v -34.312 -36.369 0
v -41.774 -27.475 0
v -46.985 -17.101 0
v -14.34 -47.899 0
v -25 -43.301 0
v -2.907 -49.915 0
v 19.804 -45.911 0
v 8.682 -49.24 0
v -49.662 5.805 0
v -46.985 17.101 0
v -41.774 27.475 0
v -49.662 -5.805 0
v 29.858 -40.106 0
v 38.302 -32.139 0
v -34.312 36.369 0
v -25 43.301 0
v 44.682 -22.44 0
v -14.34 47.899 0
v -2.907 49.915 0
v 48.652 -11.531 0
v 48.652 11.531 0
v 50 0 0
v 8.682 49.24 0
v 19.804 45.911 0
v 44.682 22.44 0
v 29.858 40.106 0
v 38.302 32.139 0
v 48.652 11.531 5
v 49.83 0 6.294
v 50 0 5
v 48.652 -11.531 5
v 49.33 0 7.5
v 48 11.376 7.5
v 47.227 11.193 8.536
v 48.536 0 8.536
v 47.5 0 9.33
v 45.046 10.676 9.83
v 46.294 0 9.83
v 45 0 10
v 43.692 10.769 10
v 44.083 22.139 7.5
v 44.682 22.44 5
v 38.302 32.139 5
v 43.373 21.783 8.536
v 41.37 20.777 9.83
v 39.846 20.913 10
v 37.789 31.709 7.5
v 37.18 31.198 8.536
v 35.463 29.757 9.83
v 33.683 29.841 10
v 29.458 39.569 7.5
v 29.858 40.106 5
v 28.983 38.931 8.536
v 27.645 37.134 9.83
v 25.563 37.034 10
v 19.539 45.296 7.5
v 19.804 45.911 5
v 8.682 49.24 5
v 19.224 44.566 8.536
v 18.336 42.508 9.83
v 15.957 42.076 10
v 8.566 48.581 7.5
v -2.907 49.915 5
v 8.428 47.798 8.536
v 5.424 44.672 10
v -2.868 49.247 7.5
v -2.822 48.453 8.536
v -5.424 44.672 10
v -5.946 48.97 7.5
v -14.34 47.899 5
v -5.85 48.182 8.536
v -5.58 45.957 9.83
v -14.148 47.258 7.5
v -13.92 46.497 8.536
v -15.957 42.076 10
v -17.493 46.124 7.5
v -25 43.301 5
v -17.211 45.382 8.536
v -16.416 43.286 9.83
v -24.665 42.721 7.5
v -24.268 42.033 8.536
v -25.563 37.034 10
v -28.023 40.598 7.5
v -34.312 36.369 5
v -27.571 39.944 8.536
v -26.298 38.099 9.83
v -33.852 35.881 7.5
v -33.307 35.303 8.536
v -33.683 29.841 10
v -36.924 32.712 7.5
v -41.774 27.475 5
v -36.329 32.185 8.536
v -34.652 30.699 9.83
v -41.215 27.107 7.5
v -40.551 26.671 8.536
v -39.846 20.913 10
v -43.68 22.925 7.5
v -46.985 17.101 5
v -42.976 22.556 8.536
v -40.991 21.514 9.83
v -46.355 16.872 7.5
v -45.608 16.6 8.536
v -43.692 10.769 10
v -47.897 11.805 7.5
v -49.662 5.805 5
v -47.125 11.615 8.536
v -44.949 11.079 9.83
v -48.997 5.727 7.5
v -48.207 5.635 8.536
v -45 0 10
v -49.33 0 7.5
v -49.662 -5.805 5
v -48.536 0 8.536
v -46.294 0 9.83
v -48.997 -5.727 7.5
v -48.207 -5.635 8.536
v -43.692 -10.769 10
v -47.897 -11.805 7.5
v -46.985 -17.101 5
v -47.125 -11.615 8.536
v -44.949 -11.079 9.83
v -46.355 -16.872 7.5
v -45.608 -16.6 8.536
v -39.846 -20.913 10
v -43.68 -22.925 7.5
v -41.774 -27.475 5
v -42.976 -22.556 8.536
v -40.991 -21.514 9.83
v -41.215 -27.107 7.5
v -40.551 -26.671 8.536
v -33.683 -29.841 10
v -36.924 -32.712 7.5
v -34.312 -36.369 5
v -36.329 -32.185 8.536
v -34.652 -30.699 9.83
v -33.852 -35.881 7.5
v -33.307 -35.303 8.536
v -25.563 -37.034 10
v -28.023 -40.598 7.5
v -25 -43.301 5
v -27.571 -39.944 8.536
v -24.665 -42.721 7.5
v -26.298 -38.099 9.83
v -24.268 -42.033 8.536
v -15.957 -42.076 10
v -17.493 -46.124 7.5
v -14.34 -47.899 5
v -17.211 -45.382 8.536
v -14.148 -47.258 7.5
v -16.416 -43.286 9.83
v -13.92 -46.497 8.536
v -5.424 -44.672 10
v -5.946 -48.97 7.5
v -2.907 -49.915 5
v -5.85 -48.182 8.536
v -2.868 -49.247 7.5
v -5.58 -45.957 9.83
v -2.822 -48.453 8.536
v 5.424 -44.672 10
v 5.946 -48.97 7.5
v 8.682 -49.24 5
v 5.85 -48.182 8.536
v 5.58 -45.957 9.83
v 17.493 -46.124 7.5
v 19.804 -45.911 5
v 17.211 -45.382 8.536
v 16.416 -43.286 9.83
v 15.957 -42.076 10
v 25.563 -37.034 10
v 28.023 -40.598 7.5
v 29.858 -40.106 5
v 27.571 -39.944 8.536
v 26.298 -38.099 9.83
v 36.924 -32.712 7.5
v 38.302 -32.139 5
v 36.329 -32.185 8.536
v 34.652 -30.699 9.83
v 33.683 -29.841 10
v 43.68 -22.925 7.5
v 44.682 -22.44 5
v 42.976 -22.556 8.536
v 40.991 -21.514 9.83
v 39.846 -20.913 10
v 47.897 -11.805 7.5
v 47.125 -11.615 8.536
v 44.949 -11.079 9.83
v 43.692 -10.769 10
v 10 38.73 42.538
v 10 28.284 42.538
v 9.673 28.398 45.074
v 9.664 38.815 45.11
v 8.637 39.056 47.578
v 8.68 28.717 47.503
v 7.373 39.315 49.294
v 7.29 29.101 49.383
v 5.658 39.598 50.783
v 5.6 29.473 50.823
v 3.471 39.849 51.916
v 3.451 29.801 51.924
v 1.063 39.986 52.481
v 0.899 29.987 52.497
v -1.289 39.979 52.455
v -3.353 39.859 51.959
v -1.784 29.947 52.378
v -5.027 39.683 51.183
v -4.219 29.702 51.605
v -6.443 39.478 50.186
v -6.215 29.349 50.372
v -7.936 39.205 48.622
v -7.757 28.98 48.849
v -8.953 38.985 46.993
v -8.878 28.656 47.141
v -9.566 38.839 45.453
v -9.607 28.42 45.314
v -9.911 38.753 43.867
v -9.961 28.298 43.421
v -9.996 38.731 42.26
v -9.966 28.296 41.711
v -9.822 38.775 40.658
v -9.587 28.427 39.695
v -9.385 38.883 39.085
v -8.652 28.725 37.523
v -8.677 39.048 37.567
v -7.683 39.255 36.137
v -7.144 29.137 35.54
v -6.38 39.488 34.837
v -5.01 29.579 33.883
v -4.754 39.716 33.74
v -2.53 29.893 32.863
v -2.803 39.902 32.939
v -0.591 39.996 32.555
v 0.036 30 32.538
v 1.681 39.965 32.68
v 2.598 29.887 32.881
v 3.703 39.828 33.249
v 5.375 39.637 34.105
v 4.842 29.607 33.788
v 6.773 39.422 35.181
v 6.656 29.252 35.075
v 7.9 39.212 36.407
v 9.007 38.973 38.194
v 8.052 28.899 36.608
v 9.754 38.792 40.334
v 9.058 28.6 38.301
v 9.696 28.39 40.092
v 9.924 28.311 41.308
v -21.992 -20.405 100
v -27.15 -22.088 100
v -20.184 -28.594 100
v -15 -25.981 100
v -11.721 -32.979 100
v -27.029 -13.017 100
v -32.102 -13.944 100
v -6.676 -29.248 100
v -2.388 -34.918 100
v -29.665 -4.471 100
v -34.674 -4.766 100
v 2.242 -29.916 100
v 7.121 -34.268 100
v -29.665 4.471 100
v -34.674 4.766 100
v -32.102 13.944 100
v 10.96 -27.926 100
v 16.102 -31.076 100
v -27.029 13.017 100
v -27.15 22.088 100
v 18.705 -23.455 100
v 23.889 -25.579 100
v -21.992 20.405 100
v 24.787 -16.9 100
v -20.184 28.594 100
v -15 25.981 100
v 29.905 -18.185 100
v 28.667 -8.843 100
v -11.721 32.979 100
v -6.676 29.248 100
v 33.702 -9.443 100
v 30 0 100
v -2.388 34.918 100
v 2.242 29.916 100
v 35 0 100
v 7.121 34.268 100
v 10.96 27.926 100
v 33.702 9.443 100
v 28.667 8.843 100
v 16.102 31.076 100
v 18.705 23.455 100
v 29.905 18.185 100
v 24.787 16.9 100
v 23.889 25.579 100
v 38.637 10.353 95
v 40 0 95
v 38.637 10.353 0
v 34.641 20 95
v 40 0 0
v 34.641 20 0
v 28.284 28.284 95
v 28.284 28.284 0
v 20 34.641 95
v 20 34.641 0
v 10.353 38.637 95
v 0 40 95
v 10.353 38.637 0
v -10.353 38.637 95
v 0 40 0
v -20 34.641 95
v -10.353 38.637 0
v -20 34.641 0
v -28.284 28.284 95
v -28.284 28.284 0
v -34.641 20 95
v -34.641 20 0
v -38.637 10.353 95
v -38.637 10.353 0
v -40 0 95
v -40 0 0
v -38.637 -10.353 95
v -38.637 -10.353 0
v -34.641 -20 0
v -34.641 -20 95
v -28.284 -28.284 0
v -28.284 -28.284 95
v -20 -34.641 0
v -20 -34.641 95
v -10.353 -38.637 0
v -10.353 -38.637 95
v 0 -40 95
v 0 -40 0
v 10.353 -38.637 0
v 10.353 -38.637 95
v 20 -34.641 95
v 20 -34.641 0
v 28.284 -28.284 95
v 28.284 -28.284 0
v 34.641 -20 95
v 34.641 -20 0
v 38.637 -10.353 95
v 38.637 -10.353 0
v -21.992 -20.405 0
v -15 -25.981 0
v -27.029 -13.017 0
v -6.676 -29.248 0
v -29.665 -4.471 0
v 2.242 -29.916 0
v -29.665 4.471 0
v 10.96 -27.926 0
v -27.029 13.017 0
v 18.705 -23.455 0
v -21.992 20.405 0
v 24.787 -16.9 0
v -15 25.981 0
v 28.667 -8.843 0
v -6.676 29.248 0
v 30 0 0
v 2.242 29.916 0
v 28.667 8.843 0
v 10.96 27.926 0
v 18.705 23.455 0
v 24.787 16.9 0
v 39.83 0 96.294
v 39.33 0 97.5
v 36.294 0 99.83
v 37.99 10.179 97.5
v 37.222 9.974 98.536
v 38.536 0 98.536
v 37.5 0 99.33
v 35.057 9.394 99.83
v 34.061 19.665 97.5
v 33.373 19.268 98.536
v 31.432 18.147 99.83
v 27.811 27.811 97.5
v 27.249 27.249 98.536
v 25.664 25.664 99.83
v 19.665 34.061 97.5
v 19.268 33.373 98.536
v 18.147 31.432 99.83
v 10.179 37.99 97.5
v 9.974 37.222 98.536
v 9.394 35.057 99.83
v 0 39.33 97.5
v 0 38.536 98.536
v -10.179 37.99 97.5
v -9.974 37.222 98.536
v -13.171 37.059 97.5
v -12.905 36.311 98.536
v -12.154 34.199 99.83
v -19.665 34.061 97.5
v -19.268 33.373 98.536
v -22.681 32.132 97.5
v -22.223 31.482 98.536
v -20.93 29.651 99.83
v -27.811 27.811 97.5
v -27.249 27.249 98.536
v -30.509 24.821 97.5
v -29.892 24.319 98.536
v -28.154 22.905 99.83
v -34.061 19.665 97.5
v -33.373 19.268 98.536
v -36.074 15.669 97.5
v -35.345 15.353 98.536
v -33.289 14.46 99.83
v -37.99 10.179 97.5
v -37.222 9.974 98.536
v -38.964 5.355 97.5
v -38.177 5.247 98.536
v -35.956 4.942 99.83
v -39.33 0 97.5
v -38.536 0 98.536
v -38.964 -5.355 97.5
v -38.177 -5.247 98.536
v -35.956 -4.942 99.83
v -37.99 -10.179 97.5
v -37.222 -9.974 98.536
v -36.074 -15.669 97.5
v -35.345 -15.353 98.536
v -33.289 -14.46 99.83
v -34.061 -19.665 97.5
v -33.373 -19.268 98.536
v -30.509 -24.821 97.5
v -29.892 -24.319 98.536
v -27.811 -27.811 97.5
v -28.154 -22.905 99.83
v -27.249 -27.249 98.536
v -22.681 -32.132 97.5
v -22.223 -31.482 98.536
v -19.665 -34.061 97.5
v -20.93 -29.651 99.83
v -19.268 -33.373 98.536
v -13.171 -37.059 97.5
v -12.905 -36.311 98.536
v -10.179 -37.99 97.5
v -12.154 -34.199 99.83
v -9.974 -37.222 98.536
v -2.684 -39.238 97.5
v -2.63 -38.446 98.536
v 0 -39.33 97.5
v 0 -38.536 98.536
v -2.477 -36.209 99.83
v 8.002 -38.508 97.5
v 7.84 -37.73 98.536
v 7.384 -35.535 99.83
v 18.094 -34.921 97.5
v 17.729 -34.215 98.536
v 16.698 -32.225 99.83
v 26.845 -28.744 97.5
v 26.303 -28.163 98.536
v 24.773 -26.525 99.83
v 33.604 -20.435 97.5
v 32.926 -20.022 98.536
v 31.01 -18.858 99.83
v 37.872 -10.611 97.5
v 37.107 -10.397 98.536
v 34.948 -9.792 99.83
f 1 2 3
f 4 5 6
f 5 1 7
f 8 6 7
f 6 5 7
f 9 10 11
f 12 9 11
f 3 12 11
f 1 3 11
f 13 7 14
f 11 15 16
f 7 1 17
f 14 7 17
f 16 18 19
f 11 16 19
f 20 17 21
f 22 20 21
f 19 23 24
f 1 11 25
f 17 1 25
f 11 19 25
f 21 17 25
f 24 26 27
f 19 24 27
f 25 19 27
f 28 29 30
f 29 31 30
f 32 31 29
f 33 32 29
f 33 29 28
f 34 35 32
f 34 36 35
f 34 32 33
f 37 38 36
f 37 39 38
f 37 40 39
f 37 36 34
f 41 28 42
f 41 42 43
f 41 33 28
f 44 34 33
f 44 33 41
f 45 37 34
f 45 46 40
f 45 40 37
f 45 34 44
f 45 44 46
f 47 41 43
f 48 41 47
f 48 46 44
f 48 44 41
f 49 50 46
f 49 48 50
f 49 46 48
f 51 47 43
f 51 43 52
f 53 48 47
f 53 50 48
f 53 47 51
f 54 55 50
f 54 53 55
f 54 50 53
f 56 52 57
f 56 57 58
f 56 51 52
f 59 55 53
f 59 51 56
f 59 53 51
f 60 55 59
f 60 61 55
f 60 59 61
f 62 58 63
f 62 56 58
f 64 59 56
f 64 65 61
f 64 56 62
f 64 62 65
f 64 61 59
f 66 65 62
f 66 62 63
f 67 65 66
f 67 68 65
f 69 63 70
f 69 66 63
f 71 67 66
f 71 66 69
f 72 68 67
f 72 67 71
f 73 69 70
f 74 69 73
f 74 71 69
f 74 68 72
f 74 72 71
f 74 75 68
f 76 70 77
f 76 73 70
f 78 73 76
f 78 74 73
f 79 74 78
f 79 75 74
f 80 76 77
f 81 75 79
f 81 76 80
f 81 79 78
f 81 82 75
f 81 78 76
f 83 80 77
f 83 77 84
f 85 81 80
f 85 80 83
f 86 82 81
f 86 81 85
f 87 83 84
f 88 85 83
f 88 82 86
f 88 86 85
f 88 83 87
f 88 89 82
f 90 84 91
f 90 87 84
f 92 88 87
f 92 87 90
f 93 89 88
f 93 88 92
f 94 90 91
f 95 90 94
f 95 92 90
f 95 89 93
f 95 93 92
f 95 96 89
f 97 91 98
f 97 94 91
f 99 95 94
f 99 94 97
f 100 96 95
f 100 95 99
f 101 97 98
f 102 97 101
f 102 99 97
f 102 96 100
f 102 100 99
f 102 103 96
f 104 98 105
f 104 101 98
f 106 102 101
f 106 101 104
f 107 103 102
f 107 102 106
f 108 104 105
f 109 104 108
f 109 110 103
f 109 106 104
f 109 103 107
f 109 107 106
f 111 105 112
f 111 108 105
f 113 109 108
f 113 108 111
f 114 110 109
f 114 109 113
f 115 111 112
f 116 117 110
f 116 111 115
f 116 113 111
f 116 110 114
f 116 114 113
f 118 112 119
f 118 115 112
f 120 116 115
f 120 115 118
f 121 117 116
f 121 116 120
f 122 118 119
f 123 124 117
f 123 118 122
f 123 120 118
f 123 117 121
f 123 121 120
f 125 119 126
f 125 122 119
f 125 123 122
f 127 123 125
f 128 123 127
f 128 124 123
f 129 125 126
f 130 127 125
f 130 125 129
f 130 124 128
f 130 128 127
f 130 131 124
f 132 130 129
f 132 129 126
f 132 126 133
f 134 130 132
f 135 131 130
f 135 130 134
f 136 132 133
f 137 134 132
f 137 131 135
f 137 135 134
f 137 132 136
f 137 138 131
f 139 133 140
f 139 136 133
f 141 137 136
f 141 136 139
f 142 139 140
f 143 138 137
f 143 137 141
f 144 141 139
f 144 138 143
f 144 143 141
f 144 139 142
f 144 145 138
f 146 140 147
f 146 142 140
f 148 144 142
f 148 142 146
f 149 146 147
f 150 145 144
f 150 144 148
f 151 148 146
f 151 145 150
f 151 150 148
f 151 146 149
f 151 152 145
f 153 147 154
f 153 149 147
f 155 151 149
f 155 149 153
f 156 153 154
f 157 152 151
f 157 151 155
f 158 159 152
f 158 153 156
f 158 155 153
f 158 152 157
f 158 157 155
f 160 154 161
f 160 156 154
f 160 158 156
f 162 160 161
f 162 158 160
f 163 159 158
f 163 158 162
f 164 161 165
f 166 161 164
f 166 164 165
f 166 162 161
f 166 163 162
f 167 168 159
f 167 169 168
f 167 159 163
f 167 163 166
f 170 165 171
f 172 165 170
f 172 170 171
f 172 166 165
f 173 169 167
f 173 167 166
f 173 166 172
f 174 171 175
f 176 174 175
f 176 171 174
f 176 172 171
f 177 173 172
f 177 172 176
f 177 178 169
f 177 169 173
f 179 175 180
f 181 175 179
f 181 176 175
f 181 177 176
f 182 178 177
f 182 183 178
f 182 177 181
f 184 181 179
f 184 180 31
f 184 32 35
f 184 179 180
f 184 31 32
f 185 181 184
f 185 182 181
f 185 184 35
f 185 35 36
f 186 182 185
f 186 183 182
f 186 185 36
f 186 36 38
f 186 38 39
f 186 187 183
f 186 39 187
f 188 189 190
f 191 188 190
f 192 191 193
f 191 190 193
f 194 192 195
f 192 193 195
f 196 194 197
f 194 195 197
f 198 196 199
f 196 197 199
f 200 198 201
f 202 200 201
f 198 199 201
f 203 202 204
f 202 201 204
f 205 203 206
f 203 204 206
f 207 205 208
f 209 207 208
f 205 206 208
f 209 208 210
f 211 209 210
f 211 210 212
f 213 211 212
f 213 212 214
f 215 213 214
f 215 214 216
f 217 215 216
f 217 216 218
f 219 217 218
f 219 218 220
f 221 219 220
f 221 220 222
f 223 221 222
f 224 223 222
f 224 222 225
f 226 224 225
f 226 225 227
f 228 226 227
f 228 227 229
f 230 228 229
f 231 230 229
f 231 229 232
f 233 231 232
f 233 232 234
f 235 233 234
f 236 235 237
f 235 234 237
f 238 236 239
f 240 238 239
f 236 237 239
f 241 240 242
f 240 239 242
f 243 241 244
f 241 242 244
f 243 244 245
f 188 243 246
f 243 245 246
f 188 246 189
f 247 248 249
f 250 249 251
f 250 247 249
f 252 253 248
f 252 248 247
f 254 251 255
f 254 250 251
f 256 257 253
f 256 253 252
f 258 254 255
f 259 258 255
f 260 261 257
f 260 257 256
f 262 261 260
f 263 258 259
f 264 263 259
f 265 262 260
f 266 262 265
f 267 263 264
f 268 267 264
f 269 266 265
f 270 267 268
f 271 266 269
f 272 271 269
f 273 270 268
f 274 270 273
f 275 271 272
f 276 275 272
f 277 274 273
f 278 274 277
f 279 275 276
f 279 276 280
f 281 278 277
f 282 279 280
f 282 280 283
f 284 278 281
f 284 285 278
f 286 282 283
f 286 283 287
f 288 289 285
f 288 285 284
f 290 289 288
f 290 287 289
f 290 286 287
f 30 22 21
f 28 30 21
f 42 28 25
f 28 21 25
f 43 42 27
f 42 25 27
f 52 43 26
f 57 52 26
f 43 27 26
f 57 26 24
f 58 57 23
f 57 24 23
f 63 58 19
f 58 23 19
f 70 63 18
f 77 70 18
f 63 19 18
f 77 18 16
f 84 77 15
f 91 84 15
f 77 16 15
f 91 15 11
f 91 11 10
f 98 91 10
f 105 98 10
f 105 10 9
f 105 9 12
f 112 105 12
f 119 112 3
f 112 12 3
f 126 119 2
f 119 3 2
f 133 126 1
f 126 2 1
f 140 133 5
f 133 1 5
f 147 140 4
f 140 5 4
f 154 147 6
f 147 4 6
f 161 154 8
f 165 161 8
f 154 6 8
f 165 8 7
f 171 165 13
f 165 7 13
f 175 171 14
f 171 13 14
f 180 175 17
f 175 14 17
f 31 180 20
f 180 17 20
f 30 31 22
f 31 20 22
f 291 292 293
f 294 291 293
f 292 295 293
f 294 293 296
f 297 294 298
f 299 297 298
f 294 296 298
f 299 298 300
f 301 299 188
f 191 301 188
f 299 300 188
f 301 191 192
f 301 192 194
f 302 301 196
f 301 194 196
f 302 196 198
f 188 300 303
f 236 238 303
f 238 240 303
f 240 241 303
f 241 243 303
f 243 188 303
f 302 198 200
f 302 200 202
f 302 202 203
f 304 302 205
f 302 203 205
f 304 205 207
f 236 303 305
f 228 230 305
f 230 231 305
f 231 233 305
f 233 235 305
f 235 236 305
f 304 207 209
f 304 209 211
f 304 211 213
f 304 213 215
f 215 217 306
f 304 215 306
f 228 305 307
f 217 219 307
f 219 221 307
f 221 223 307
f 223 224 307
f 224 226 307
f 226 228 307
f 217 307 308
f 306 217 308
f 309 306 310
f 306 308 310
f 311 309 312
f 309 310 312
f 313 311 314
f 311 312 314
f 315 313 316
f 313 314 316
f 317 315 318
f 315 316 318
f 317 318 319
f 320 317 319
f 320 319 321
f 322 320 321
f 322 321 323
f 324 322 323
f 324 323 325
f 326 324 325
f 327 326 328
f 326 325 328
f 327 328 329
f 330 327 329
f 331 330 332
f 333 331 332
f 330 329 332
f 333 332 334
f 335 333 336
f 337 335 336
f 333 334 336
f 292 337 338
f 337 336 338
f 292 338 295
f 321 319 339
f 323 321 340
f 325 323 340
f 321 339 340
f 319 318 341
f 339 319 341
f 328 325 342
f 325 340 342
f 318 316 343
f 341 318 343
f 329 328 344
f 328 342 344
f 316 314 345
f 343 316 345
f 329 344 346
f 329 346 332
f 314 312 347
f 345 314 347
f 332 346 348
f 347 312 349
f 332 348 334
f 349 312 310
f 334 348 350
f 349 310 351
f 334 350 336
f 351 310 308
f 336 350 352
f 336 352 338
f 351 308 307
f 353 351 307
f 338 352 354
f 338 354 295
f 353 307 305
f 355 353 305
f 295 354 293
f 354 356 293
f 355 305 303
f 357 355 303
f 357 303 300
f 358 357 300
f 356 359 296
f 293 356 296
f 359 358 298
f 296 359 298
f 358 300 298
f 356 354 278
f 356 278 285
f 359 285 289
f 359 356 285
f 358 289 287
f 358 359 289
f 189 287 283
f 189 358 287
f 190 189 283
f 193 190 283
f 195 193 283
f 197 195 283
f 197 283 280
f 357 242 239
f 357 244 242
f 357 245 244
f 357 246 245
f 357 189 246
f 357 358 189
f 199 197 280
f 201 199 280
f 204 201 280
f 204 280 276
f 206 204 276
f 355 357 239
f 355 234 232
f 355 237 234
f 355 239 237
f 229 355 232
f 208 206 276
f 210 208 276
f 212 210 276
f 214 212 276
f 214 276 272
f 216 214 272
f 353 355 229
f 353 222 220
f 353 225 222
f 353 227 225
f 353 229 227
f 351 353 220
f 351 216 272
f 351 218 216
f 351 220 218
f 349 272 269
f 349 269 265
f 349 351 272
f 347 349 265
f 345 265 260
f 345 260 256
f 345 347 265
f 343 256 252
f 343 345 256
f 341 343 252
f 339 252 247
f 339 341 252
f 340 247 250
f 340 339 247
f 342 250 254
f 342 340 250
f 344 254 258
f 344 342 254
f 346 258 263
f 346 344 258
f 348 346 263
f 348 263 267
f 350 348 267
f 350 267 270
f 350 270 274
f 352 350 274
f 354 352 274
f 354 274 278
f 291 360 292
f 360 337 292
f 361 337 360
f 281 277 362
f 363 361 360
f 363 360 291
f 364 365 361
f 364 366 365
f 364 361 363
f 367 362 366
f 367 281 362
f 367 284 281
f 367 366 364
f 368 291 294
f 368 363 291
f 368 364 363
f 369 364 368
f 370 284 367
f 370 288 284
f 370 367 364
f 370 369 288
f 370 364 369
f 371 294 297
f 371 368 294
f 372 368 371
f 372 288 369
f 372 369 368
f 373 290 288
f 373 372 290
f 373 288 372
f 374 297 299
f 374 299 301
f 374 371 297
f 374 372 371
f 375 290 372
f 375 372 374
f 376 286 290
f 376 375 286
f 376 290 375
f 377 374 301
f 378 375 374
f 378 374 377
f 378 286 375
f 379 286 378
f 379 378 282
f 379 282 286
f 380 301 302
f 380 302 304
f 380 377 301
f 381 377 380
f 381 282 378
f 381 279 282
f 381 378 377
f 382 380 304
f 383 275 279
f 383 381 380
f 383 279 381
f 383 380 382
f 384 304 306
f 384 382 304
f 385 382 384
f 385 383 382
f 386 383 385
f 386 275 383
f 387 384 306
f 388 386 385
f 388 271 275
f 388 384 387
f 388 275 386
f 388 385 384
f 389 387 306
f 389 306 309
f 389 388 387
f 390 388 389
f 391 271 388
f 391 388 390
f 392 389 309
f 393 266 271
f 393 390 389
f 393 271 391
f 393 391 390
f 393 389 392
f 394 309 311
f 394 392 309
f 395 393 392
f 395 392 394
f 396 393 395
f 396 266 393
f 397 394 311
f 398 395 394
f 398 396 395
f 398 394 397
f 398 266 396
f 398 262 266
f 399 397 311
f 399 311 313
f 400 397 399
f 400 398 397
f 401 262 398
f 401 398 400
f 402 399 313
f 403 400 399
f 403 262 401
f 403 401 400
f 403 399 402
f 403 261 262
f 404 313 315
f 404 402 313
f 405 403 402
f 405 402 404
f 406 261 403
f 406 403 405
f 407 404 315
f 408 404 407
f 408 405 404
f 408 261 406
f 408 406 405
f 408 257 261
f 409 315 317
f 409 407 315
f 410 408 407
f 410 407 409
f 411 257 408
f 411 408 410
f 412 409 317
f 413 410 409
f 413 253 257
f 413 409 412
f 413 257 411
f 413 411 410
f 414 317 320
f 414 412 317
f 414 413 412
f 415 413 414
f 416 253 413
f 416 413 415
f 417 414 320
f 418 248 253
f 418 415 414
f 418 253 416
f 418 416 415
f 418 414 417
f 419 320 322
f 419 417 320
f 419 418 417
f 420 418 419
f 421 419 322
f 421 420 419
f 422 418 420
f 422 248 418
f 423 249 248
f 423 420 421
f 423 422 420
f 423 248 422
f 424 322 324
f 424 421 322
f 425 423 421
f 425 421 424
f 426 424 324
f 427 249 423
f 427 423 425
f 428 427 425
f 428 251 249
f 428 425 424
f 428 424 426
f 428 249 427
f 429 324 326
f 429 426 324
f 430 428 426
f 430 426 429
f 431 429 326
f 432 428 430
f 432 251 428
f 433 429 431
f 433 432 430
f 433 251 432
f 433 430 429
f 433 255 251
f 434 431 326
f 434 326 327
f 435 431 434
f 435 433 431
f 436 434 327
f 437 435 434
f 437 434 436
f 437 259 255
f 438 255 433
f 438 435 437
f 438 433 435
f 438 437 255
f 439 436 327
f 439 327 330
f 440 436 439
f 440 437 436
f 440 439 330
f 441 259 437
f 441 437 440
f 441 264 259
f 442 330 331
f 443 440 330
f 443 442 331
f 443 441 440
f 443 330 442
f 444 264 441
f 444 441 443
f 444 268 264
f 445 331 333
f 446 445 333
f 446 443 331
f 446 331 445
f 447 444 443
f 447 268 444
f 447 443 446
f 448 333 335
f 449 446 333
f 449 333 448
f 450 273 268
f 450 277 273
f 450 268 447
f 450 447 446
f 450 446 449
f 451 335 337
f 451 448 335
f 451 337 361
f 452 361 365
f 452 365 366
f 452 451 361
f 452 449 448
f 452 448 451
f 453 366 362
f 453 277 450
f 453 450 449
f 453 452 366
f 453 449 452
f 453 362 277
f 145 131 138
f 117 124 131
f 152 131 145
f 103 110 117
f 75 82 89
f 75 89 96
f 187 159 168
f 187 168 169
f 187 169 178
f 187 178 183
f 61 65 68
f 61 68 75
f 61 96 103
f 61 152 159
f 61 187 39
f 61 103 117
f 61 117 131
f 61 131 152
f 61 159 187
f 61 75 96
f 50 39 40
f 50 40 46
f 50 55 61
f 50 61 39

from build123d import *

# Parameters (mm, degrees)
F0_R     = 50
F1_DEPTH = 10
F2_R     = 40
F2_R_2   = 30
F3_DEPTH = 100
F4_R     = 5
F4_2_R   = 5
F6_D     = 20
F6_DEPTH = 40.001


with BuildPart() as f1:
    # F0 (on Top) → F1 (new body)
    with BuildSketch(Plane.XY):
        Circle(F0_R)
    extrude(amount=F1_DEPTH)

    # F4#2
    f4_2_edges = [f1.edges().sort_by_distance(p)[0] for p in [
        (-50, 0, 10),
    ]]
    fillet(f4_2_edges, radius=F4_2_R)


with BuildPart() as f3:
    # F2 (on Top) → F3 (new body)
    with BuildSketch(Plane.XY):
        Circle(F2_R)
        Circle(F2_R_2, mode=Mode.SUBTRACT)
    extrude(amount=F3_DEPTH)

    # F4
    f4_edges = [f3.edges().sort_by_distance(p)[0] for p in [
        (-40, 0, 100),
    ]]
    fillet(f4_edges, radius=F4_R)

    # F6 (through all, one way)
    with BuildSketch(Plane.XZ):
        with Locations((0, 42.537920177)):
            Circle(F6_D / 2)
    extrude(amount=-F6_DEPTH, mode=Mode.SUBTRACT)


solid = Compound([f1.part, f3.part])
